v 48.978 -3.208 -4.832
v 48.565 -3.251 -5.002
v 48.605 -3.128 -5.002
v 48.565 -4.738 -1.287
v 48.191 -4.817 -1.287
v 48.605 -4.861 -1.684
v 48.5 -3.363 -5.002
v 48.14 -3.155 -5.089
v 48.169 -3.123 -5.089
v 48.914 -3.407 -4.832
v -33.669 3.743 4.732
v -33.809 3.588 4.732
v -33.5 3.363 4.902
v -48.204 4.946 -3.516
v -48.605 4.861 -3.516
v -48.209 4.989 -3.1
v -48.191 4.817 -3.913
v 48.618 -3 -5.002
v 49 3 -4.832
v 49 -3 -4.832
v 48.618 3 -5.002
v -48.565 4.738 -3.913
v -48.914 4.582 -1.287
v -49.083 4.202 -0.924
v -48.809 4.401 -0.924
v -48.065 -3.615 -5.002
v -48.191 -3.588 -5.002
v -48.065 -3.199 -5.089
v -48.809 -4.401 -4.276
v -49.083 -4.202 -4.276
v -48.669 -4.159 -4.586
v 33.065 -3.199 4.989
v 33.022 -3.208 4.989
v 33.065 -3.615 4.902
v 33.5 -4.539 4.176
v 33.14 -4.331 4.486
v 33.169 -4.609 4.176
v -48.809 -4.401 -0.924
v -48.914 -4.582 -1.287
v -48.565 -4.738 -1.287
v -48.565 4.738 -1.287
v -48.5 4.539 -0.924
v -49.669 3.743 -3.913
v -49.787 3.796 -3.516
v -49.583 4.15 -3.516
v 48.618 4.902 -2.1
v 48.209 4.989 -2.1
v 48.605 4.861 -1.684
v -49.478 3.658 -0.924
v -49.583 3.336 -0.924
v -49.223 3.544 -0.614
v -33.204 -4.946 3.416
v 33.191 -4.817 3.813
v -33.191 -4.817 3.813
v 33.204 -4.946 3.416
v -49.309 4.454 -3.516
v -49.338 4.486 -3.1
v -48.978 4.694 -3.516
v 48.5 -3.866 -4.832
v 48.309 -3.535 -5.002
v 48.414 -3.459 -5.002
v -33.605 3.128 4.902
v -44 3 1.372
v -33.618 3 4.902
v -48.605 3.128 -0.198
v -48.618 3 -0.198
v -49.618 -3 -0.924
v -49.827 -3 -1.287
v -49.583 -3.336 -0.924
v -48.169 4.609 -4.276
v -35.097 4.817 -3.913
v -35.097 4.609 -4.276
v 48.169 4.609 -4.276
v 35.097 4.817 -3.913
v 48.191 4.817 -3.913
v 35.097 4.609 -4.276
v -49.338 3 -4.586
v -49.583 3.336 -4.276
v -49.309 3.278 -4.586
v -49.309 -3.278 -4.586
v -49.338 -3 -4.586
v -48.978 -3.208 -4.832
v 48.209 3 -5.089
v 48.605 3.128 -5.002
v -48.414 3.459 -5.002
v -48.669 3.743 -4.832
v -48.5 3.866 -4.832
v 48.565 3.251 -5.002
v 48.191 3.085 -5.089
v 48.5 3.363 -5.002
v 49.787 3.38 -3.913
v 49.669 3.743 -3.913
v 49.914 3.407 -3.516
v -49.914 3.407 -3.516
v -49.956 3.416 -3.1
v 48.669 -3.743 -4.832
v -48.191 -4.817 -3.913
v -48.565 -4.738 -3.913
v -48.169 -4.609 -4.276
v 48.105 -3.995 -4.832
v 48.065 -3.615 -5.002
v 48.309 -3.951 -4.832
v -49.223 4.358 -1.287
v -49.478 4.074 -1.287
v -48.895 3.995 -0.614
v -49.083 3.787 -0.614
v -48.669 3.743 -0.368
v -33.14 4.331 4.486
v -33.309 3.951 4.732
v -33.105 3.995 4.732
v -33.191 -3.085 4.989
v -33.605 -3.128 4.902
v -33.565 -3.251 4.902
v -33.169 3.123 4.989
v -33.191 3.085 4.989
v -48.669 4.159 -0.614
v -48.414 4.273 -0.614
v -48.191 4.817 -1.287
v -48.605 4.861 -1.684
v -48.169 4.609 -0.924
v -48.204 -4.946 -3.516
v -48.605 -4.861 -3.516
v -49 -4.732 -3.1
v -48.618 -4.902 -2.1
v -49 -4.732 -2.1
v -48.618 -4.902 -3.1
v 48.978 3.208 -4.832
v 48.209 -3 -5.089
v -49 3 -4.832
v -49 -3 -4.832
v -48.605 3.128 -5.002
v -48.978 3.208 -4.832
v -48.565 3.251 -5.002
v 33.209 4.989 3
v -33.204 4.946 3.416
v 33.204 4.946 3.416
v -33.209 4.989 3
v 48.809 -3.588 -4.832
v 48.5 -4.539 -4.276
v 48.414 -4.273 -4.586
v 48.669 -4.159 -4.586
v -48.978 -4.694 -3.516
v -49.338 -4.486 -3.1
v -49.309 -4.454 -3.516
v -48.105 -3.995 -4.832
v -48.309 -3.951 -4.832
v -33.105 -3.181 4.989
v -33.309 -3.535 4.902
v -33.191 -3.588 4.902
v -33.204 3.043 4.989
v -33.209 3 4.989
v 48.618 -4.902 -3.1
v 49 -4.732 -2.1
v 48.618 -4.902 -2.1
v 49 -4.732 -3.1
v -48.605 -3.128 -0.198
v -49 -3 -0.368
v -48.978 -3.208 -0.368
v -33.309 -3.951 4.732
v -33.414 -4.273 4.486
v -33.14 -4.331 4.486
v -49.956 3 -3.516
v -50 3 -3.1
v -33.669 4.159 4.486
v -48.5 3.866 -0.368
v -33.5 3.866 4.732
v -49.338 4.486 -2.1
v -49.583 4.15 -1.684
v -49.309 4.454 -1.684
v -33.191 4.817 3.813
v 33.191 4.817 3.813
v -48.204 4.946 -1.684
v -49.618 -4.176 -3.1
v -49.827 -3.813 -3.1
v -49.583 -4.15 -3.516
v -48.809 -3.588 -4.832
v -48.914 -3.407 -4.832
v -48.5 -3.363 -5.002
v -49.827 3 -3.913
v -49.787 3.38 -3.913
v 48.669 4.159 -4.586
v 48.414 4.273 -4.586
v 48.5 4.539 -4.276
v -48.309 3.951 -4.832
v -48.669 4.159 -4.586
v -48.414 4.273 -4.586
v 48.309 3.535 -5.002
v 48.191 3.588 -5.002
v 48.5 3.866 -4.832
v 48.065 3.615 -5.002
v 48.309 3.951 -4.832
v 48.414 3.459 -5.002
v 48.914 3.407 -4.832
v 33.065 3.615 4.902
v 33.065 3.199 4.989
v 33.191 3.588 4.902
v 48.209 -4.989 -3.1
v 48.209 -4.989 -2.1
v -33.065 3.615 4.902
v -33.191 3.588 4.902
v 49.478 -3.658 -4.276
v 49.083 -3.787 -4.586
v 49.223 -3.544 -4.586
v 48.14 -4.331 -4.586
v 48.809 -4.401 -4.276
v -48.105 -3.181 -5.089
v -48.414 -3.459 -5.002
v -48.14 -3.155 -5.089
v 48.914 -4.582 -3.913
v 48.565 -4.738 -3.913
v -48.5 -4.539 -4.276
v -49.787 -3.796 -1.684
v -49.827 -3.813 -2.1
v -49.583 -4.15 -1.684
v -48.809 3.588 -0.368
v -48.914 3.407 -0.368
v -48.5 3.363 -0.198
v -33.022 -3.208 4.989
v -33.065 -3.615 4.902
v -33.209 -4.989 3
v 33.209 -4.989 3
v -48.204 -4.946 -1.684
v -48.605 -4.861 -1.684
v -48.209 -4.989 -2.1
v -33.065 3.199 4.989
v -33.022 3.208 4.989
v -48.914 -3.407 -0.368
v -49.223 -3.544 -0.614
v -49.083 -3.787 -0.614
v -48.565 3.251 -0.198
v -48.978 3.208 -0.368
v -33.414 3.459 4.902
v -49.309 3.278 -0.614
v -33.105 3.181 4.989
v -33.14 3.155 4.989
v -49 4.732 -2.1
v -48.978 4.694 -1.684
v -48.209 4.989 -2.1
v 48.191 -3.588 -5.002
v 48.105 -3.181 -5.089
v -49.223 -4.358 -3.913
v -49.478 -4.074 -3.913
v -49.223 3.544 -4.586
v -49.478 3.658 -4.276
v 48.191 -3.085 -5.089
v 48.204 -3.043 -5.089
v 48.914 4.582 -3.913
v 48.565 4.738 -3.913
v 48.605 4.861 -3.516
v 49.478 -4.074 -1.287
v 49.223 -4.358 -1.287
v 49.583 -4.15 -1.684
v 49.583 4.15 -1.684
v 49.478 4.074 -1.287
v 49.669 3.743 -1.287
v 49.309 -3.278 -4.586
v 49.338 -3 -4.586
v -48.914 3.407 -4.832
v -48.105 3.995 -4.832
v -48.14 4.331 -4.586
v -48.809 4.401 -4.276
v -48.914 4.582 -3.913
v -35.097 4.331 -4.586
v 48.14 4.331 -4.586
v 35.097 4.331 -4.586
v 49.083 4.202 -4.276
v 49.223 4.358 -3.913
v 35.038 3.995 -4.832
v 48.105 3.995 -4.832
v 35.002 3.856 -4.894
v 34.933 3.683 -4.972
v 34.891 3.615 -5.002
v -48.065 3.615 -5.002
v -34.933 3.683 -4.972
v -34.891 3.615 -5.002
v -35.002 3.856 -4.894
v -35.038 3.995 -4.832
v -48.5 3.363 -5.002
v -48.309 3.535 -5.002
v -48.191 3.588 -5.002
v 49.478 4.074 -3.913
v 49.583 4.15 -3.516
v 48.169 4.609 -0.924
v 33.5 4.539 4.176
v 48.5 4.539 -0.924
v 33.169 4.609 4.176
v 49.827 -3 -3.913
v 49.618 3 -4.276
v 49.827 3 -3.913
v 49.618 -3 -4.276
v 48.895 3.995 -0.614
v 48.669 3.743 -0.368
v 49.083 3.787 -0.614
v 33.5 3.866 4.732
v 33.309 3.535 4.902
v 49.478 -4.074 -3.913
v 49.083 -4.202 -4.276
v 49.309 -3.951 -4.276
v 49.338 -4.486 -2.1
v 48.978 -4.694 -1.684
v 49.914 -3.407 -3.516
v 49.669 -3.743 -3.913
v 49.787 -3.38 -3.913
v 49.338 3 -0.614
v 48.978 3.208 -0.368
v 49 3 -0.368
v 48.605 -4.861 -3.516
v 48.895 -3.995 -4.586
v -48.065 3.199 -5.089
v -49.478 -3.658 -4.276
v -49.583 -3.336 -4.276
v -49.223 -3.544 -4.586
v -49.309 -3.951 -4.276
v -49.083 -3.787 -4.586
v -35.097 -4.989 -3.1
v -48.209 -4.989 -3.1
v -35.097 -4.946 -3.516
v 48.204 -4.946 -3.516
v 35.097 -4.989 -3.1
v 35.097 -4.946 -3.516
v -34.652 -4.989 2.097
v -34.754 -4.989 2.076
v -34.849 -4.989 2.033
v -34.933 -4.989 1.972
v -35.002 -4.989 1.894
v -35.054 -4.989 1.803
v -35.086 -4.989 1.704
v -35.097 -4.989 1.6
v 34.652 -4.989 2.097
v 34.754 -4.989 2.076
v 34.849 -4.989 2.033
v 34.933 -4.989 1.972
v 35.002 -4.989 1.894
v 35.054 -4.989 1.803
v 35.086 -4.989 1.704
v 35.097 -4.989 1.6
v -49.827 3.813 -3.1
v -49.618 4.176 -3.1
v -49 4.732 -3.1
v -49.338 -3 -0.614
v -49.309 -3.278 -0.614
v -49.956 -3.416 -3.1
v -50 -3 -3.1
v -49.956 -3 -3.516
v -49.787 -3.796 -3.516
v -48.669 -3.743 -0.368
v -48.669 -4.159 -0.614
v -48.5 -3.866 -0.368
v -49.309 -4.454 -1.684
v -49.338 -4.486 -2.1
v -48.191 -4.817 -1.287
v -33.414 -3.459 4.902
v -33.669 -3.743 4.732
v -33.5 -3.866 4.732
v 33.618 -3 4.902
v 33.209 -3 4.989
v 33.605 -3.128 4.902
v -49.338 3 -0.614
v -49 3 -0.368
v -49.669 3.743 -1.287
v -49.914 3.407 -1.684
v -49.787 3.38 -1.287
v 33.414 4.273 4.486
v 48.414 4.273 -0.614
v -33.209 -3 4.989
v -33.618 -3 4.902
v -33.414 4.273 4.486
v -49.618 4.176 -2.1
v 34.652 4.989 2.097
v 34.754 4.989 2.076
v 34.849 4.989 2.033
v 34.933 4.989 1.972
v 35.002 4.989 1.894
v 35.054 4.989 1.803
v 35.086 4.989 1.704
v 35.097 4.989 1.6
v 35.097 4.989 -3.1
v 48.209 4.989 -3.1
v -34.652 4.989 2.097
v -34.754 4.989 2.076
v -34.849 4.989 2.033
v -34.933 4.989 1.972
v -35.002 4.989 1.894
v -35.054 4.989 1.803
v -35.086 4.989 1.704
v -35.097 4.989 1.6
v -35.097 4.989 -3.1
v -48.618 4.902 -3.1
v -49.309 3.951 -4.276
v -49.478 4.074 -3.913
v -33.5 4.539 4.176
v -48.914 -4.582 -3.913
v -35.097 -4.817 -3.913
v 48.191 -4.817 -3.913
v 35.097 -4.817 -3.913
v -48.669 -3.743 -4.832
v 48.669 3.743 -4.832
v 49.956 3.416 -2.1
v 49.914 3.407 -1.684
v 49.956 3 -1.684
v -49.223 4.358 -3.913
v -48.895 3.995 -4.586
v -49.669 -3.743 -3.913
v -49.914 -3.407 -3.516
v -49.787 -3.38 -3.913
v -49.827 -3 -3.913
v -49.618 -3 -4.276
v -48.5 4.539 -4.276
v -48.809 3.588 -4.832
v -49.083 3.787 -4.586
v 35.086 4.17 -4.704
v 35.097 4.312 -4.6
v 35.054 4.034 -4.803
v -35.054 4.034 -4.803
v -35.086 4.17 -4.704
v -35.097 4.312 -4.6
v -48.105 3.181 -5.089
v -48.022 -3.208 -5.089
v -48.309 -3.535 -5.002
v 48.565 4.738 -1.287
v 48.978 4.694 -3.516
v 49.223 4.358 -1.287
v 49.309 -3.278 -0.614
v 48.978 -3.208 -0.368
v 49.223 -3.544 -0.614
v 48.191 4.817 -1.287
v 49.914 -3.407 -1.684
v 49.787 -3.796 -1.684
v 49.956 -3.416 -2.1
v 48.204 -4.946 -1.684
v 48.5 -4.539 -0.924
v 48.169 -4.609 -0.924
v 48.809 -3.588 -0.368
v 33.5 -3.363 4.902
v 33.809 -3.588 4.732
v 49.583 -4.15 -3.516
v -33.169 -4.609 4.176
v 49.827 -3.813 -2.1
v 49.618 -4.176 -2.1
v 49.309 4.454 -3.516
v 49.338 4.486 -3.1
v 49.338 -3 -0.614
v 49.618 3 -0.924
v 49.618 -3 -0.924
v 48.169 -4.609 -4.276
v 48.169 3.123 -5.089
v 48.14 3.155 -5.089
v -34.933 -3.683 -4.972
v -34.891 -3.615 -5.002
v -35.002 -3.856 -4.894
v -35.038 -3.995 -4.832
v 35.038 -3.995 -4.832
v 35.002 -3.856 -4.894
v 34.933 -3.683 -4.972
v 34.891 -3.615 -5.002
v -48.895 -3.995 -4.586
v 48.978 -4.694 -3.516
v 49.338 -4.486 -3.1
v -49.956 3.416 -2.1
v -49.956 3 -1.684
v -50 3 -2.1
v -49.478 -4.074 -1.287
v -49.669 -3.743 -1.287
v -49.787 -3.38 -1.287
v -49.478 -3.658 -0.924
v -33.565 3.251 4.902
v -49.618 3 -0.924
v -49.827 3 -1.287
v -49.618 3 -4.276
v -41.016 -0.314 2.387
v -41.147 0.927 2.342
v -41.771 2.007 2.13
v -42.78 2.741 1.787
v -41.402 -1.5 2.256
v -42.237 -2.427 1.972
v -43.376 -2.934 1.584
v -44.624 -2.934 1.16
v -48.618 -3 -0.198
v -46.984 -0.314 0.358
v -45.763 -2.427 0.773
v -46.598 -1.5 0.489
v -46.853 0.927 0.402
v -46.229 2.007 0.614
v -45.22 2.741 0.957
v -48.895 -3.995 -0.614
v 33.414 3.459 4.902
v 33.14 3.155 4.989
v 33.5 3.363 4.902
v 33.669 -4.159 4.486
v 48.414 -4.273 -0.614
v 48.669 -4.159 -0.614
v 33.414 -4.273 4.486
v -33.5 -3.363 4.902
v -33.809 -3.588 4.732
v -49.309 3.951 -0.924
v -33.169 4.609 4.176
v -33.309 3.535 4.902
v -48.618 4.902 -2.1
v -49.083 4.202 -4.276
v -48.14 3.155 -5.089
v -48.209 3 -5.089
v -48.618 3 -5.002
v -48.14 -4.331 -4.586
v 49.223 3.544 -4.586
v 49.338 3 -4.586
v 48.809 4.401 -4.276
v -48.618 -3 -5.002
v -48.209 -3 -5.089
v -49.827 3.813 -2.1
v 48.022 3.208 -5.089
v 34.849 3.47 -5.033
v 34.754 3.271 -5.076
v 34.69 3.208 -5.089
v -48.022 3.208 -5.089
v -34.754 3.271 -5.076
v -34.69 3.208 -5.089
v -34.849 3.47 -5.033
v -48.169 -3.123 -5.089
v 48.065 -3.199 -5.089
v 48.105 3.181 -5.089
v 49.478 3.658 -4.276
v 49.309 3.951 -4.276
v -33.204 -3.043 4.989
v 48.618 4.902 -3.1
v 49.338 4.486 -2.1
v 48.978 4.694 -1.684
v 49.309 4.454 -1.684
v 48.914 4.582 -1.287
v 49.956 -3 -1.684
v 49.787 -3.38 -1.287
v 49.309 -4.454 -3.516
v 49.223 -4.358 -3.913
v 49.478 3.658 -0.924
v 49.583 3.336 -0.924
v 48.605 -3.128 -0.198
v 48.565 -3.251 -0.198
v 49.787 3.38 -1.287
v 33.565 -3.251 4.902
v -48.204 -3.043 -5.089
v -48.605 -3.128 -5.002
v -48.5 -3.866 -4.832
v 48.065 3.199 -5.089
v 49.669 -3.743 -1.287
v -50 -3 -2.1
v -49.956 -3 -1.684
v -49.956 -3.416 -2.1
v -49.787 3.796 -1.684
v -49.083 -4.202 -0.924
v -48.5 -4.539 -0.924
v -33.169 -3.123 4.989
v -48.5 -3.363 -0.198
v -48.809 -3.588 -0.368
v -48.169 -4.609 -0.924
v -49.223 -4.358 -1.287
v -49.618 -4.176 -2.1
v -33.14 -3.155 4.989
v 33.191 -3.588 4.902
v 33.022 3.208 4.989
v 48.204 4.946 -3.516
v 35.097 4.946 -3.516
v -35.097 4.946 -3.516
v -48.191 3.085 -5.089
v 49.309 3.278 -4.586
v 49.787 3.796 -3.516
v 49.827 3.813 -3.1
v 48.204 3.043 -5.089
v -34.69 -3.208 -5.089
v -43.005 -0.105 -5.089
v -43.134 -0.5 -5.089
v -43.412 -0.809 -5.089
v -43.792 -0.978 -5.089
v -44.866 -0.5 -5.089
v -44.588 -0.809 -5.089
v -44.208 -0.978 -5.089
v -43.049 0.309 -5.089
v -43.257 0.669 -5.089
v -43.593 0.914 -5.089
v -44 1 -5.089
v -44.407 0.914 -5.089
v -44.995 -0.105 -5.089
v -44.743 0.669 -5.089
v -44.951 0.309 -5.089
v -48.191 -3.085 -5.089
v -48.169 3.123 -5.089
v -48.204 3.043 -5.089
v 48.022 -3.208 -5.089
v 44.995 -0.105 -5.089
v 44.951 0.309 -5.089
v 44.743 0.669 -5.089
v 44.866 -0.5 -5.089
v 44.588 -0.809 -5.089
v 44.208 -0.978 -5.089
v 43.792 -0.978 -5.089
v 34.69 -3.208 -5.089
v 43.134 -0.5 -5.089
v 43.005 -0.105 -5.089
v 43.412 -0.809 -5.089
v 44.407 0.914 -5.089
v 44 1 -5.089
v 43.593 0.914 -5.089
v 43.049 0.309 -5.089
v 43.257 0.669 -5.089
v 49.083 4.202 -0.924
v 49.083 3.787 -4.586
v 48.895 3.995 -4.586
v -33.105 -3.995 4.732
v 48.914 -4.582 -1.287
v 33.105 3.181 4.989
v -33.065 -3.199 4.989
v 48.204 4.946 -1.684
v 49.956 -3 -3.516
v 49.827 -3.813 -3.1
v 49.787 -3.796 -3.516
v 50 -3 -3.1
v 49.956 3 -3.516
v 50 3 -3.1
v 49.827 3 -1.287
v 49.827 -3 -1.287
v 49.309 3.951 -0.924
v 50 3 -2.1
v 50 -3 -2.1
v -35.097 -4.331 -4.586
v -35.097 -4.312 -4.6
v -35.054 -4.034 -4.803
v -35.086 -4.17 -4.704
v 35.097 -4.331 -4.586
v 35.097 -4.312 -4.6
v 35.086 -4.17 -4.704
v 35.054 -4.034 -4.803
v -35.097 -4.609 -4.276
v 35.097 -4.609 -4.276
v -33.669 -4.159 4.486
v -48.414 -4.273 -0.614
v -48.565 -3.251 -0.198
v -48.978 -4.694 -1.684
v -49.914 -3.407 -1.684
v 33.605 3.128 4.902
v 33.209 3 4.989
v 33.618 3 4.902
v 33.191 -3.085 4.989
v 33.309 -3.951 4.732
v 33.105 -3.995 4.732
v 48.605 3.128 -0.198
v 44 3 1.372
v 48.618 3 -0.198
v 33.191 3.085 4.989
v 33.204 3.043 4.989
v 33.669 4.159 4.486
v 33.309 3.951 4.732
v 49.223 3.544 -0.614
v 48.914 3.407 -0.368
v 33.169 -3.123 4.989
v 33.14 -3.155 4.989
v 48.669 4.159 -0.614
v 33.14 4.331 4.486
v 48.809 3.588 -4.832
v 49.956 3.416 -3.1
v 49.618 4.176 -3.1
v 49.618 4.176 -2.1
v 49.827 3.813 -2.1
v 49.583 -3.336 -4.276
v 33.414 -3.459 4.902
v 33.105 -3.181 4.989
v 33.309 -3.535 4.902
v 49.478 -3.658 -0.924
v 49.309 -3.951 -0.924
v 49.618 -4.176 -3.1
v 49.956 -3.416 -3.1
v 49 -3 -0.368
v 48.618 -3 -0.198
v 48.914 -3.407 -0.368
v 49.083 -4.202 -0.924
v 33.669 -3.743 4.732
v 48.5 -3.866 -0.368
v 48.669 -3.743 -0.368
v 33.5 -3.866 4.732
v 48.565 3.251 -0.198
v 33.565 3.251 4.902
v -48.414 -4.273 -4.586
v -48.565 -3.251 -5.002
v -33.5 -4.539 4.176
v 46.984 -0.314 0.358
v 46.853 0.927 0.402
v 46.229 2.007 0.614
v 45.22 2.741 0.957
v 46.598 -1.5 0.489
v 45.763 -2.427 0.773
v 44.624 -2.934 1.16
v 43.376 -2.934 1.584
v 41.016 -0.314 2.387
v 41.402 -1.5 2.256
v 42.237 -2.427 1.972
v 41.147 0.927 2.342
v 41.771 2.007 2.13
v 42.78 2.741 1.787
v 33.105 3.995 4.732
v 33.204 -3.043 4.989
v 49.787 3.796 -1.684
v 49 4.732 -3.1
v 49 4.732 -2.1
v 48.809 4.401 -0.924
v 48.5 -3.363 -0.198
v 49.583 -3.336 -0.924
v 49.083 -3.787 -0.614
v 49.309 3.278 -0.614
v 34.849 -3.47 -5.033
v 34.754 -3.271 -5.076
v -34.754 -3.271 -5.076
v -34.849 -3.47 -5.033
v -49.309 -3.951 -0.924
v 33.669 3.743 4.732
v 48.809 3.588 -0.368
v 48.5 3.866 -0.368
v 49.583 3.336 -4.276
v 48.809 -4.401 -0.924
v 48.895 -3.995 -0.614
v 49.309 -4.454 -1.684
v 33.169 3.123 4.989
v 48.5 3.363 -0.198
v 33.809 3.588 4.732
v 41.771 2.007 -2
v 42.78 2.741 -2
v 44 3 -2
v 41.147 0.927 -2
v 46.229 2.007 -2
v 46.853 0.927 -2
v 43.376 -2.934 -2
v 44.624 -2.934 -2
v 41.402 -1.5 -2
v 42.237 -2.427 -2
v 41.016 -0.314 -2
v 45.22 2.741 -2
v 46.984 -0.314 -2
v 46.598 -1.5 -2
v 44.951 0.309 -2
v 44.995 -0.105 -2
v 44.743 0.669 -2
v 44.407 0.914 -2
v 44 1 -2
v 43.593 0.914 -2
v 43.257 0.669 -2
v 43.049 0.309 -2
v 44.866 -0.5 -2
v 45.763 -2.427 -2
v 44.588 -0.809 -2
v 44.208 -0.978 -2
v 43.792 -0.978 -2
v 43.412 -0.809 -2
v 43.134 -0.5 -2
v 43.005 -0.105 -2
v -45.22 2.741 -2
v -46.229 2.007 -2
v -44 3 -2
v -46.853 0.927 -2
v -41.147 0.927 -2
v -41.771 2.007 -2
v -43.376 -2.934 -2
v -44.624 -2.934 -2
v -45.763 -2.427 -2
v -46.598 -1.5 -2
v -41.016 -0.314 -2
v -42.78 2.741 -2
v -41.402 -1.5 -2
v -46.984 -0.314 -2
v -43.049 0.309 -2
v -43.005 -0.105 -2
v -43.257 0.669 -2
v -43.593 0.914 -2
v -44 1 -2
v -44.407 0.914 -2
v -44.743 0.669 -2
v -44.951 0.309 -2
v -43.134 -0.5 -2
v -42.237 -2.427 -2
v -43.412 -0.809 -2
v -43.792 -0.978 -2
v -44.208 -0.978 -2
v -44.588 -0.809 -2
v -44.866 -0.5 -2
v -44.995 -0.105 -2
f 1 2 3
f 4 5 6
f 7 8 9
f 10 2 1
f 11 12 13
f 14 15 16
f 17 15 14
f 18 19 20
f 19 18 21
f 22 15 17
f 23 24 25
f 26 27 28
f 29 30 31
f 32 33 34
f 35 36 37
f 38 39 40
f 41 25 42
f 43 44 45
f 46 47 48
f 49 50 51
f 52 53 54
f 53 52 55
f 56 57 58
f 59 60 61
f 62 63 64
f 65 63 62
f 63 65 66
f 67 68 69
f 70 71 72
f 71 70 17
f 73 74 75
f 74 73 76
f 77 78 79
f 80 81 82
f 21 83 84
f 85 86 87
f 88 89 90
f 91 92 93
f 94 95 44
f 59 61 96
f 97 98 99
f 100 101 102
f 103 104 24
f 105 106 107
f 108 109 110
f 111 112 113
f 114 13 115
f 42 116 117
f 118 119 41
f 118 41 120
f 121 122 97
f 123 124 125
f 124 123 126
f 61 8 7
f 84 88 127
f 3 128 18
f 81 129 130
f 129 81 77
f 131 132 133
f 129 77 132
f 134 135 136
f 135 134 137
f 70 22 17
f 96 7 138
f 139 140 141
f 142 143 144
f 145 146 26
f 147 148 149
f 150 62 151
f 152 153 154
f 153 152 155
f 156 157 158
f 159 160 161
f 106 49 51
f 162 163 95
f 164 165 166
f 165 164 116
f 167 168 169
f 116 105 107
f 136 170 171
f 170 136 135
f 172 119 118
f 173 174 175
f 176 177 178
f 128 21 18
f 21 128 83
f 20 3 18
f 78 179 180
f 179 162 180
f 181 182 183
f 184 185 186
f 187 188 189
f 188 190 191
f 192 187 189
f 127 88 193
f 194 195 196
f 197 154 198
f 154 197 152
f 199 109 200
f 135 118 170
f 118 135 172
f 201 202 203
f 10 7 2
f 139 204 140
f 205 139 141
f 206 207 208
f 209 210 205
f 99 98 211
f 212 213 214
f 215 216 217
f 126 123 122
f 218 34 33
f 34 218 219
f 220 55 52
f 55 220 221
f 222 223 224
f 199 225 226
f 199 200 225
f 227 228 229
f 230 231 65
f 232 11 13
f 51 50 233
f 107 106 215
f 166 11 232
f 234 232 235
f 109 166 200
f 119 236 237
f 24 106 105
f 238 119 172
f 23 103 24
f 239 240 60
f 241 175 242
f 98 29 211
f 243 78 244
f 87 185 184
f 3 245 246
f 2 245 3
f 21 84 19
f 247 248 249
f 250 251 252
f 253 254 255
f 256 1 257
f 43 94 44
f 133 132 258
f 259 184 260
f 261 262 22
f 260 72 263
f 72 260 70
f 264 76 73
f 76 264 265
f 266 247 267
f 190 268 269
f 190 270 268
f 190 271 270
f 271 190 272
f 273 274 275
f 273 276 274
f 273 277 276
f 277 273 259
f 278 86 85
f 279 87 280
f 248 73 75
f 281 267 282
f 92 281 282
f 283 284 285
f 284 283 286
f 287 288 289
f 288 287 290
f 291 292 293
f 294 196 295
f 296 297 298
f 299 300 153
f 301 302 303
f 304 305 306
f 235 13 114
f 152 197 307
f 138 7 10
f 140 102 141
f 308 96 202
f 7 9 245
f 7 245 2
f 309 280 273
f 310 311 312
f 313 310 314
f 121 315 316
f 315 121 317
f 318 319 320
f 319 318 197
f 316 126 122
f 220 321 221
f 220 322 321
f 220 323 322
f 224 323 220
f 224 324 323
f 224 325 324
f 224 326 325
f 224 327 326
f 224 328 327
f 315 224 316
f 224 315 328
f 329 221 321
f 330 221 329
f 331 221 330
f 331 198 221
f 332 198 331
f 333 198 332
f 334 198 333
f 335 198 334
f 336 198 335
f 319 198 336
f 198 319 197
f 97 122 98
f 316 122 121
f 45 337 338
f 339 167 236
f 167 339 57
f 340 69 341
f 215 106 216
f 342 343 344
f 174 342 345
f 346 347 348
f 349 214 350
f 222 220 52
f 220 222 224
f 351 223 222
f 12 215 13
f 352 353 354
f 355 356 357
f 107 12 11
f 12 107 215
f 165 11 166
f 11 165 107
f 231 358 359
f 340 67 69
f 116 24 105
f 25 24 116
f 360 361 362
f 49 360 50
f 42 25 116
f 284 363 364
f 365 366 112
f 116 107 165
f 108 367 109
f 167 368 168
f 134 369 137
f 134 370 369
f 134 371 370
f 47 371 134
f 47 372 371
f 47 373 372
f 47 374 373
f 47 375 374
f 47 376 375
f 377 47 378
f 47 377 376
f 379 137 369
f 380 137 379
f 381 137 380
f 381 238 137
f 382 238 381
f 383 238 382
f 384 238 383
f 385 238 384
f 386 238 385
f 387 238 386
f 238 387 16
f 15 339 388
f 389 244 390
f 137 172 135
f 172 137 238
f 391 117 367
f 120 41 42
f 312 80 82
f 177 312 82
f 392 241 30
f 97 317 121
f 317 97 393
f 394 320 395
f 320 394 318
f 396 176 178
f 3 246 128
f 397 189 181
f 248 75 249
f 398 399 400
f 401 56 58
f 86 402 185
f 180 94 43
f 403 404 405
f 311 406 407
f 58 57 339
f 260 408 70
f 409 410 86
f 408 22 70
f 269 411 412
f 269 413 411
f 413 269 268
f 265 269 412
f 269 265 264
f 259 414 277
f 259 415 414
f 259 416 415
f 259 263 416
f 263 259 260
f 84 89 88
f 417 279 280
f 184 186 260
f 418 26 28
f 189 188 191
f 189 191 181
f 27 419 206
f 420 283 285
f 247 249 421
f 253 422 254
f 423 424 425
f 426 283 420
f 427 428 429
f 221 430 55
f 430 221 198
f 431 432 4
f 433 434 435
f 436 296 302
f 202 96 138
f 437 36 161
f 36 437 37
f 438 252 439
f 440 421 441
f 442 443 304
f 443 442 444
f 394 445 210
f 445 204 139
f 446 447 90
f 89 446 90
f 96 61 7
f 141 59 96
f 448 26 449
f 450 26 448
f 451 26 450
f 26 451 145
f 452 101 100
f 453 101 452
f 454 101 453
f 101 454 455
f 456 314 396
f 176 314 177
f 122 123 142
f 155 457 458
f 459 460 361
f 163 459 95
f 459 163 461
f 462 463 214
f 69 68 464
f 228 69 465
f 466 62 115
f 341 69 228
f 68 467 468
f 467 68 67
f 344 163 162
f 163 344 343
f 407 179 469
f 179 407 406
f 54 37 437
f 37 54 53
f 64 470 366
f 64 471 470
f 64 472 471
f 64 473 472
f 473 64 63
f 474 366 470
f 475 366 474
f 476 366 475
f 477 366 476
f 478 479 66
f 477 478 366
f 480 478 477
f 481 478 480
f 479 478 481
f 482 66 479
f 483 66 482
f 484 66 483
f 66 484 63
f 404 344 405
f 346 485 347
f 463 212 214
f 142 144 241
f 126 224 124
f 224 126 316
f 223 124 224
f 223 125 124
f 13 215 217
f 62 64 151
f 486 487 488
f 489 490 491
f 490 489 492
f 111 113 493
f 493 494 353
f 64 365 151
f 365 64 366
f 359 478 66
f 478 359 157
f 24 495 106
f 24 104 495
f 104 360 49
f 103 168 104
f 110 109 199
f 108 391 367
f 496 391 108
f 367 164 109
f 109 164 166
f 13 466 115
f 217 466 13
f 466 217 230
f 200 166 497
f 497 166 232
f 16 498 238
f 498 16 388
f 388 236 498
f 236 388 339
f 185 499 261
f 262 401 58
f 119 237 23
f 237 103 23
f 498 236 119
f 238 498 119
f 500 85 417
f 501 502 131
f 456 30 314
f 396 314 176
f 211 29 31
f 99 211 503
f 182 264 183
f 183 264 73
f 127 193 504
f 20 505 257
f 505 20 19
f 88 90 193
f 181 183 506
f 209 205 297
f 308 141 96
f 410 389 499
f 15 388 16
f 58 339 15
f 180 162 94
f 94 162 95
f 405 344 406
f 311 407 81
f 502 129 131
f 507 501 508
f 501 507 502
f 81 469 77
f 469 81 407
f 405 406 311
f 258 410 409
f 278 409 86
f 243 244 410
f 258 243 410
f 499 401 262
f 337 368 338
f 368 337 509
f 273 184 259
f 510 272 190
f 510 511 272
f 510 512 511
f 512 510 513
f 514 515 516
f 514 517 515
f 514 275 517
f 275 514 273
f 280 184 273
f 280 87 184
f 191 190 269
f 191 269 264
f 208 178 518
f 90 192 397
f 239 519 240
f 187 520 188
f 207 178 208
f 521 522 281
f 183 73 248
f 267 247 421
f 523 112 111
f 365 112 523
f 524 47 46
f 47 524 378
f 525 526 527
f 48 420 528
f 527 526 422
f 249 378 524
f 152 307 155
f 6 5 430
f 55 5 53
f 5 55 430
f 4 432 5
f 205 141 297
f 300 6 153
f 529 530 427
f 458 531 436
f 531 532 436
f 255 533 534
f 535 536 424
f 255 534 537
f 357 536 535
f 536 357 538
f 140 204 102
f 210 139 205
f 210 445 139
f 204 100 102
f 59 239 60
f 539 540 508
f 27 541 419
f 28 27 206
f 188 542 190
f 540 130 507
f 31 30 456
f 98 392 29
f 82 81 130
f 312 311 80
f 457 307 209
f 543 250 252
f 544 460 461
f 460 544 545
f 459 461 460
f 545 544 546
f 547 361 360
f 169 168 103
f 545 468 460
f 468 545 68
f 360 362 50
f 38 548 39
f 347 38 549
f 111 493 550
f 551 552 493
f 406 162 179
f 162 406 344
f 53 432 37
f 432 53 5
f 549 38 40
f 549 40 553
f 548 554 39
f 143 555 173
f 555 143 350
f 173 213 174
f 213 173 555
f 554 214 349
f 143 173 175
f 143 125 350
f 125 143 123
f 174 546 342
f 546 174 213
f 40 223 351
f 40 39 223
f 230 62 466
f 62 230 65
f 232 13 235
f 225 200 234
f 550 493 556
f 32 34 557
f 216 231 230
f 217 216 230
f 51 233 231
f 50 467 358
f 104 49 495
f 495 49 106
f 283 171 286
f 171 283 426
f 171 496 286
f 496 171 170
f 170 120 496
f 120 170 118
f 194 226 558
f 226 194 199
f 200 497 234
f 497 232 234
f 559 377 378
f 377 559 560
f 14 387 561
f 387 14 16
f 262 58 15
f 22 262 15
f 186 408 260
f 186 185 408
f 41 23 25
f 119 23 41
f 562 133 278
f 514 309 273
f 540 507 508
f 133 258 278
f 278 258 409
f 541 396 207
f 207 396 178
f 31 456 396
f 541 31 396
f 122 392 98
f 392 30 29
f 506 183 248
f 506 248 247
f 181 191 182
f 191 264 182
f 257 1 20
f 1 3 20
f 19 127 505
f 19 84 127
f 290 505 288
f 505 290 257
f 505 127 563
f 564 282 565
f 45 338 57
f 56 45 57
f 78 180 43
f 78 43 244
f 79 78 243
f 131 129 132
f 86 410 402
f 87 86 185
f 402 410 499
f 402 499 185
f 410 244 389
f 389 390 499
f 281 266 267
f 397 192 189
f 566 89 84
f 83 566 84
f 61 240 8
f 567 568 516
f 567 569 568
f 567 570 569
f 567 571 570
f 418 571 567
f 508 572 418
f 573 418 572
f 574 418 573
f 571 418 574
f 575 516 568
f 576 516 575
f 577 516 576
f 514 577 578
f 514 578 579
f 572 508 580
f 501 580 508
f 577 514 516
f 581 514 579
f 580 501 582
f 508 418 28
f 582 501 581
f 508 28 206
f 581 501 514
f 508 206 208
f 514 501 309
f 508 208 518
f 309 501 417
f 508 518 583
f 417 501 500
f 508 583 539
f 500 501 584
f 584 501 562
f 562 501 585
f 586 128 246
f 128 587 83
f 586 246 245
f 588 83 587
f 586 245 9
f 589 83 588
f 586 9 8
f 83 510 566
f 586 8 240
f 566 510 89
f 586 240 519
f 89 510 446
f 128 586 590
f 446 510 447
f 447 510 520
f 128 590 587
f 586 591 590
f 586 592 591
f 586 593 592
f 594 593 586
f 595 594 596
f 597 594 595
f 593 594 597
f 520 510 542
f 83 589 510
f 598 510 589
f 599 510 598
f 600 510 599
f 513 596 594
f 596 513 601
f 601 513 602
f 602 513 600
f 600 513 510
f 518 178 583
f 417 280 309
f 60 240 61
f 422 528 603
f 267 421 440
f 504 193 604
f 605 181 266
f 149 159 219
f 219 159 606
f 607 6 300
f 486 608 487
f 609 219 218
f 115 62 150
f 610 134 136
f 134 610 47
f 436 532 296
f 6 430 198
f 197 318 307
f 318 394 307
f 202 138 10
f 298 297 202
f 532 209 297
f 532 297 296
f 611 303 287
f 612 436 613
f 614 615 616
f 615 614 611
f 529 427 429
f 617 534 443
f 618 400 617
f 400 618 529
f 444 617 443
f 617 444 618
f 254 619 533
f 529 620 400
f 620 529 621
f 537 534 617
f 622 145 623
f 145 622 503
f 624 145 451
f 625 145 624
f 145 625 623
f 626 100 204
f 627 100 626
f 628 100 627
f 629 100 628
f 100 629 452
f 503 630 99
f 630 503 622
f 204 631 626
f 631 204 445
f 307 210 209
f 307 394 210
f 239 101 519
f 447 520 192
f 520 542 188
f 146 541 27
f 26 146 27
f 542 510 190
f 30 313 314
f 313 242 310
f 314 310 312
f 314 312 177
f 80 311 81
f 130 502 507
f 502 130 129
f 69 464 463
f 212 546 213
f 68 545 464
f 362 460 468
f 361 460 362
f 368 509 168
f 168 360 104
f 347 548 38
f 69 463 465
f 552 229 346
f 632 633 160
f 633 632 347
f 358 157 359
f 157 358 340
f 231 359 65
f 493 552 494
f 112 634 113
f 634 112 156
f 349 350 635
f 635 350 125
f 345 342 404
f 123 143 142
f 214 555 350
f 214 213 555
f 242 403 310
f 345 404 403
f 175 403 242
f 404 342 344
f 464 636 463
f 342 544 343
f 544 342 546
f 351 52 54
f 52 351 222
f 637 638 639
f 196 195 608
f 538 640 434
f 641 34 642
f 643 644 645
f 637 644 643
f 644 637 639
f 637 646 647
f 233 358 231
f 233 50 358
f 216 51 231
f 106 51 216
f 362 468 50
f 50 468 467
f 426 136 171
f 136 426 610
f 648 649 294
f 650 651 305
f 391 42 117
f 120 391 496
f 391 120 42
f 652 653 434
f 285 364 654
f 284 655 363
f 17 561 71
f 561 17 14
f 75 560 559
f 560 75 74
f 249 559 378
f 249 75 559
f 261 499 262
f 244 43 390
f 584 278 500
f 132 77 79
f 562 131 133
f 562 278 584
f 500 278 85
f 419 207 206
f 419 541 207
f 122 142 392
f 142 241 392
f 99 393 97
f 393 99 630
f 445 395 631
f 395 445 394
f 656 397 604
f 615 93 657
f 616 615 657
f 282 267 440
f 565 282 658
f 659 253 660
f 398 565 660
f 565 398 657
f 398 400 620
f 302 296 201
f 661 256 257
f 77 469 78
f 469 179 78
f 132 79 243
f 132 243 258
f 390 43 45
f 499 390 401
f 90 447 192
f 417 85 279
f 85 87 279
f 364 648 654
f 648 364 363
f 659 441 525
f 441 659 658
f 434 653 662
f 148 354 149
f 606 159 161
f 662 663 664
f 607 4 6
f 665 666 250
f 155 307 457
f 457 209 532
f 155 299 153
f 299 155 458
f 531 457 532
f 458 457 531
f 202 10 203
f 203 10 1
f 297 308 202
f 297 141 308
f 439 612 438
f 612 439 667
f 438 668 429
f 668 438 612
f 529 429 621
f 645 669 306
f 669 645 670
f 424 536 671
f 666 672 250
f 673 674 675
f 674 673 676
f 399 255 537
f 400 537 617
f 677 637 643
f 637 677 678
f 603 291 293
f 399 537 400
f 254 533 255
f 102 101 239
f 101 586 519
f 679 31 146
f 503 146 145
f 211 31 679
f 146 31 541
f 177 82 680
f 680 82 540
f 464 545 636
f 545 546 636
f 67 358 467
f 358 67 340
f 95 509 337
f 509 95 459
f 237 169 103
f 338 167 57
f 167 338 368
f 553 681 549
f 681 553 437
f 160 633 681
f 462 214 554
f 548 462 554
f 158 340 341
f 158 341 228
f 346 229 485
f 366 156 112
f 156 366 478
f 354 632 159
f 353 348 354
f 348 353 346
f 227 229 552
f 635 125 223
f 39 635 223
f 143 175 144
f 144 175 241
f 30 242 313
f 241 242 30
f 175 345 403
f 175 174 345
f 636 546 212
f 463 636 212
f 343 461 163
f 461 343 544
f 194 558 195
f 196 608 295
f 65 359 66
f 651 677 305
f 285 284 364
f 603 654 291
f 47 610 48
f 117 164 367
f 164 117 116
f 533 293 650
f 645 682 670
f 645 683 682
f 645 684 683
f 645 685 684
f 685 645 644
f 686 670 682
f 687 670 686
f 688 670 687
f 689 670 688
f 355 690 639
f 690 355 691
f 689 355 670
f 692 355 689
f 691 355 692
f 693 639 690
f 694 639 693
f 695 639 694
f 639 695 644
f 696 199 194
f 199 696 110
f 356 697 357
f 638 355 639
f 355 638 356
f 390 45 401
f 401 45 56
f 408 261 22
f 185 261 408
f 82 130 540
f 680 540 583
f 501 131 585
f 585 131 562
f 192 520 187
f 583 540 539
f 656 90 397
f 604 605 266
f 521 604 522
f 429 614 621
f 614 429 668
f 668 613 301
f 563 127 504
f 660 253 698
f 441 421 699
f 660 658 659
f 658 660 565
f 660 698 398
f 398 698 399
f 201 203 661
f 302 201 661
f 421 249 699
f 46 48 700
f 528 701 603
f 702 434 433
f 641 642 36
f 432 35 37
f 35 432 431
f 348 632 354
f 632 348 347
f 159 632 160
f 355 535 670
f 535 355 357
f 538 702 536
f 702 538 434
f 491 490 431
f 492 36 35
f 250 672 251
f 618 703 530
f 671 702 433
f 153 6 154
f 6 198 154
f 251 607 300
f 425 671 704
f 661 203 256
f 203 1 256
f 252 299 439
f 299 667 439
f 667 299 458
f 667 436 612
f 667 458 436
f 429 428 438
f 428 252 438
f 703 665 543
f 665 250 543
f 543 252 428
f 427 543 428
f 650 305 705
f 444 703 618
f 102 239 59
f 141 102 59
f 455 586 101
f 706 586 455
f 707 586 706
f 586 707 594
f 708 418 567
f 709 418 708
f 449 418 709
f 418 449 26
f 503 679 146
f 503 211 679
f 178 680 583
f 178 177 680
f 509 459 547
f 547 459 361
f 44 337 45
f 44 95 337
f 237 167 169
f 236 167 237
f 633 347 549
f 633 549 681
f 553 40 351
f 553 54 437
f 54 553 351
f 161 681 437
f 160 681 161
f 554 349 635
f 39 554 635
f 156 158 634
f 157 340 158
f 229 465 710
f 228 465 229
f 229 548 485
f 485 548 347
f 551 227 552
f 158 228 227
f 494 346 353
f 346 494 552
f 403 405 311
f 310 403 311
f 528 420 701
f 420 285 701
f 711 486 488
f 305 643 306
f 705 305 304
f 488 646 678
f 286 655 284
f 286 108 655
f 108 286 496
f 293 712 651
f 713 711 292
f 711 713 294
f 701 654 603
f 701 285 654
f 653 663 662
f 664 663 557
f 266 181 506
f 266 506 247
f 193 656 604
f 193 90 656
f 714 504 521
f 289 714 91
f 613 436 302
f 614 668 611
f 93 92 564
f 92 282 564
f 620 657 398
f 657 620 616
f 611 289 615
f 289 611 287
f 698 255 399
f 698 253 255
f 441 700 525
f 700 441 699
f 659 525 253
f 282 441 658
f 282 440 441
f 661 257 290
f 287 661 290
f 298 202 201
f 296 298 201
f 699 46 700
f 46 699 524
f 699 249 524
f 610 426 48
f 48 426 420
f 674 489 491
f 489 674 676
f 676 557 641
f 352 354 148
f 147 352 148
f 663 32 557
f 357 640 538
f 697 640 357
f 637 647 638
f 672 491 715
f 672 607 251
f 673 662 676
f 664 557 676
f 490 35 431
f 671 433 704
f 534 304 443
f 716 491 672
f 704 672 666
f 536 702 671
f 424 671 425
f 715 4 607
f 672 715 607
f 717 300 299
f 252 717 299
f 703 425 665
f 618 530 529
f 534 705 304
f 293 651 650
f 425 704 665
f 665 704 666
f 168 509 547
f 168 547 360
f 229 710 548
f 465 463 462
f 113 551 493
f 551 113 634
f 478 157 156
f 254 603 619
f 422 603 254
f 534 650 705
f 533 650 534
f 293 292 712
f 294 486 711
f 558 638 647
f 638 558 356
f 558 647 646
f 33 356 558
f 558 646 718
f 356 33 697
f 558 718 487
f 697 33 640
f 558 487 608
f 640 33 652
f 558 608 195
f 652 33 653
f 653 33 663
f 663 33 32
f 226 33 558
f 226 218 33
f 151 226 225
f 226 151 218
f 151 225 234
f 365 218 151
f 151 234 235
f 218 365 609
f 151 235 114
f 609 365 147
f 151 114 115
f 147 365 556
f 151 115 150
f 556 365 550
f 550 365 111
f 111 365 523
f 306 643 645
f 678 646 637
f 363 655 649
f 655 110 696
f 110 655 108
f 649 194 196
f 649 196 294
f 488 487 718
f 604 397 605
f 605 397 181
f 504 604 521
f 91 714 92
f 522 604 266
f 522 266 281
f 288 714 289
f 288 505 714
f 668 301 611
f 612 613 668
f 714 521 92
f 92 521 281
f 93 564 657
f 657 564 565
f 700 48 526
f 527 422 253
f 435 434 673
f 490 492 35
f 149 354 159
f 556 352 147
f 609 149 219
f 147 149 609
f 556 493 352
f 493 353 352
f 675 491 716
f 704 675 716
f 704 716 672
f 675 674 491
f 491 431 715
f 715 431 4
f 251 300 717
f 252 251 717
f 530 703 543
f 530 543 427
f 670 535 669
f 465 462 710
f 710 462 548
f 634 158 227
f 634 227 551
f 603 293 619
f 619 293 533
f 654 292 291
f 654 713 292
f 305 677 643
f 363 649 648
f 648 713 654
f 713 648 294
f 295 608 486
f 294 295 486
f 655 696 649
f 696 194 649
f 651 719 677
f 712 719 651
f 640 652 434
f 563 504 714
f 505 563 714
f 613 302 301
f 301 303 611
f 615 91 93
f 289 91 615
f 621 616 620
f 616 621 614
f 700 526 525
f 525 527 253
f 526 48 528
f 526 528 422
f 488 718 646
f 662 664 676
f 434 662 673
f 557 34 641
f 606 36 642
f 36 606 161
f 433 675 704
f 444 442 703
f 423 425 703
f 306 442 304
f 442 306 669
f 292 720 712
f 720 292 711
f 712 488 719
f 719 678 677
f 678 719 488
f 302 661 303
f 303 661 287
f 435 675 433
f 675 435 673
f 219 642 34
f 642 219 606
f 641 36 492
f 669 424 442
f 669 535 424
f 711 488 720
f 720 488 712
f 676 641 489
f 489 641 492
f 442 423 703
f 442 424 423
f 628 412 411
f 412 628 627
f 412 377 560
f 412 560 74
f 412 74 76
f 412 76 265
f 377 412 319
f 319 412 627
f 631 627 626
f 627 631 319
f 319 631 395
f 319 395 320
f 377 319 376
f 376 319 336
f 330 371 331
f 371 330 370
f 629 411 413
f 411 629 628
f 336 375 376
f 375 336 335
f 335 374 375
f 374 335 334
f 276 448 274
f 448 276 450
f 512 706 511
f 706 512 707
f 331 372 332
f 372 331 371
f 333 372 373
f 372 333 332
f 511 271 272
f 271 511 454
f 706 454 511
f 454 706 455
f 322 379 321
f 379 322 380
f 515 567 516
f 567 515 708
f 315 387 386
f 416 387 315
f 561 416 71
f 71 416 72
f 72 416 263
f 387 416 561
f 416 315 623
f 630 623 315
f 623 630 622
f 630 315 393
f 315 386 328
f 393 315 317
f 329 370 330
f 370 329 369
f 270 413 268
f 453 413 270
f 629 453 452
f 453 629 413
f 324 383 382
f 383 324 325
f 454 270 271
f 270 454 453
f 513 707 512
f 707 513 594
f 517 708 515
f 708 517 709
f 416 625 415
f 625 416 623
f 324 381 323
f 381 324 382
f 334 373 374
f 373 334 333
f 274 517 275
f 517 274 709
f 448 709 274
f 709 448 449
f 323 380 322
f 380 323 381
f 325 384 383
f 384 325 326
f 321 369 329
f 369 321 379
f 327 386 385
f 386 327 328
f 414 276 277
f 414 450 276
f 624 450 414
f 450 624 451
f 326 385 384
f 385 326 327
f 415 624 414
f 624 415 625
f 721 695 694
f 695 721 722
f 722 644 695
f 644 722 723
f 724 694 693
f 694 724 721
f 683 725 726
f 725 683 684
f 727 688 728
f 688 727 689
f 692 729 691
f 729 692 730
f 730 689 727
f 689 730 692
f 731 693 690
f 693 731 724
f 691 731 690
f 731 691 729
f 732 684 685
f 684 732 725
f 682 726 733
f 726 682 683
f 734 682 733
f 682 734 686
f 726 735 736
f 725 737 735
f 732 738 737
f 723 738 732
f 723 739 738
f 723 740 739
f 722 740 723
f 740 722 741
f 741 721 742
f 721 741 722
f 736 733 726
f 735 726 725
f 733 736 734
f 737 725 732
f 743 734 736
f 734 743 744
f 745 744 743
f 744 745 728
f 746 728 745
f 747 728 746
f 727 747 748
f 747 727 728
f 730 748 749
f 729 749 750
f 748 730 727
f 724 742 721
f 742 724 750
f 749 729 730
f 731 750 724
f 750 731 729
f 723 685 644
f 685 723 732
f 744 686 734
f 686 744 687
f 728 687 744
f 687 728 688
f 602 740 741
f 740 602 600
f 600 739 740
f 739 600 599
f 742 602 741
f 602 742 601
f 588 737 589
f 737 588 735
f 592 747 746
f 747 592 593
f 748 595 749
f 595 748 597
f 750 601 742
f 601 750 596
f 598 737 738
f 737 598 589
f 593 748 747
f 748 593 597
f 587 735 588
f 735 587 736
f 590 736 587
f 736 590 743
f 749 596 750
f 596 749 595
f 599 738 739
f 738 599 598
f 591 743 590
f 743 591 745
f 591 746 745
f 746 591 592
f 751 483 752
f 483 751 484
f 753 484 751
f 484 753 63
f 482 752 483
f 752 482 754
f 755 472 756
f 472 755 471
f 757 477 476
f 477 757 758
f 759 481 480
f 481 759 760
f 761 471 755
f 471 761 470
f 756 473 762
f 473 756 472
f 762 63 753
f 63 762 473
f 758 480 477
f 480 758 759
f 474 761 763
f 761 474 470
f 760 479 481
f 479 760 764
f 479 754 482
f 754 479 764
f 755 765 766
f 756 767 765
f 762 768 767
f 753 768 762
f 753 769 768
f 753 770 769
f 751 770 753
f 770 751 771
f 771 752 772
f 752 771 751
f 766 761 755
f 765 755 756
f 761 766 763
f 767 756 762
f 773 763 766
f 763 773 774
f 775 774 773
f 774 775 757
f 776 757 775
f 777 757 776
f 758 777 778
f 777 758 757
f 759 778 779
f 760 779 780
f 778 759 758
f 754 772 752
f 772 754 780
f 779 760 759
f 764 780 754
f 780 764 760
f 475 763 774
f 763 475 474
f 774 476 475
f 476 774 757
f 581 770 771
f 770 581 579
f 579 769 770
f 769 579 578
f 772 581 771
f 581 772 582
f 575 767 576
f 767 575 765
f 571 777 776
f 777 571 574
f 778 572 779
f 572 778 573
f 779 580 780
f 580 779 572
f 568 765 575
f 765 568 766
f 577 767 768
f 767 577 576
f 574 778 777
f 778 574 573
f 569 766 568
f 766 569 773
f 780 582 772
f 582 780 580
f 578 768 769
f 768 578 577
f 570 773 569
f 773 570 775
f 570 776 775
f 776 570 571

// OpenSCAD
include <lib.scad>

sh_l=100;
hd_l=130;
sh_w=10;
sh_h=10;
hd_h=23;
dv_1=6;
dv_2=2;

module ssd_hold(l, w, h, v1=0, v2=0, j=0.2, ssd_l=100, ssd_w=70, ssd_h=7) {
	difference() {
	hull() {
		translate([0,0,ssd_h+j*2-h])
			hull_box(l,w,h-ssd_h,2);
		translate([0,0,0])
			hull_box(ssd_w,w,h,2);
	}
	translate([0,0,-(h-ssd_h)/2]) rotate([0,0,90])
#		hull_box(ssd_l+j,ssd_w+j,ssd_h+j,0.5);
	translate([ l/2-v1,0,h-ssd_h]) rotate([0,0,90])
		cylinder(d=v1,h=h,center=true,$fn=15);
	translate([ l/2-v1,0,0]) rotate([0,0,90])
		cylinder(d=v2,h=h+j*2,center=true,$fn=15);
	translate([-l/2+v1,0,h-ssd_h]) rotate([0,0,90])
		cylinder(d=v1,h=h,center=true,$fn=15);
	translate([-l/2+v1,0,0]) rotate([0,0,90])
		cylinder(d=v2,h=h+j*2,center=true,$fn=15);
	}
}

// SSD
ssd_hold(sh_l,sh_w,sh_h,dv_1,dv_2);


// HD
//ssd_hold(hd_l,sh_w,hd_h,dv_1,dv_2, ssd_l=145, ssd_w=101, ssd_h=20);
